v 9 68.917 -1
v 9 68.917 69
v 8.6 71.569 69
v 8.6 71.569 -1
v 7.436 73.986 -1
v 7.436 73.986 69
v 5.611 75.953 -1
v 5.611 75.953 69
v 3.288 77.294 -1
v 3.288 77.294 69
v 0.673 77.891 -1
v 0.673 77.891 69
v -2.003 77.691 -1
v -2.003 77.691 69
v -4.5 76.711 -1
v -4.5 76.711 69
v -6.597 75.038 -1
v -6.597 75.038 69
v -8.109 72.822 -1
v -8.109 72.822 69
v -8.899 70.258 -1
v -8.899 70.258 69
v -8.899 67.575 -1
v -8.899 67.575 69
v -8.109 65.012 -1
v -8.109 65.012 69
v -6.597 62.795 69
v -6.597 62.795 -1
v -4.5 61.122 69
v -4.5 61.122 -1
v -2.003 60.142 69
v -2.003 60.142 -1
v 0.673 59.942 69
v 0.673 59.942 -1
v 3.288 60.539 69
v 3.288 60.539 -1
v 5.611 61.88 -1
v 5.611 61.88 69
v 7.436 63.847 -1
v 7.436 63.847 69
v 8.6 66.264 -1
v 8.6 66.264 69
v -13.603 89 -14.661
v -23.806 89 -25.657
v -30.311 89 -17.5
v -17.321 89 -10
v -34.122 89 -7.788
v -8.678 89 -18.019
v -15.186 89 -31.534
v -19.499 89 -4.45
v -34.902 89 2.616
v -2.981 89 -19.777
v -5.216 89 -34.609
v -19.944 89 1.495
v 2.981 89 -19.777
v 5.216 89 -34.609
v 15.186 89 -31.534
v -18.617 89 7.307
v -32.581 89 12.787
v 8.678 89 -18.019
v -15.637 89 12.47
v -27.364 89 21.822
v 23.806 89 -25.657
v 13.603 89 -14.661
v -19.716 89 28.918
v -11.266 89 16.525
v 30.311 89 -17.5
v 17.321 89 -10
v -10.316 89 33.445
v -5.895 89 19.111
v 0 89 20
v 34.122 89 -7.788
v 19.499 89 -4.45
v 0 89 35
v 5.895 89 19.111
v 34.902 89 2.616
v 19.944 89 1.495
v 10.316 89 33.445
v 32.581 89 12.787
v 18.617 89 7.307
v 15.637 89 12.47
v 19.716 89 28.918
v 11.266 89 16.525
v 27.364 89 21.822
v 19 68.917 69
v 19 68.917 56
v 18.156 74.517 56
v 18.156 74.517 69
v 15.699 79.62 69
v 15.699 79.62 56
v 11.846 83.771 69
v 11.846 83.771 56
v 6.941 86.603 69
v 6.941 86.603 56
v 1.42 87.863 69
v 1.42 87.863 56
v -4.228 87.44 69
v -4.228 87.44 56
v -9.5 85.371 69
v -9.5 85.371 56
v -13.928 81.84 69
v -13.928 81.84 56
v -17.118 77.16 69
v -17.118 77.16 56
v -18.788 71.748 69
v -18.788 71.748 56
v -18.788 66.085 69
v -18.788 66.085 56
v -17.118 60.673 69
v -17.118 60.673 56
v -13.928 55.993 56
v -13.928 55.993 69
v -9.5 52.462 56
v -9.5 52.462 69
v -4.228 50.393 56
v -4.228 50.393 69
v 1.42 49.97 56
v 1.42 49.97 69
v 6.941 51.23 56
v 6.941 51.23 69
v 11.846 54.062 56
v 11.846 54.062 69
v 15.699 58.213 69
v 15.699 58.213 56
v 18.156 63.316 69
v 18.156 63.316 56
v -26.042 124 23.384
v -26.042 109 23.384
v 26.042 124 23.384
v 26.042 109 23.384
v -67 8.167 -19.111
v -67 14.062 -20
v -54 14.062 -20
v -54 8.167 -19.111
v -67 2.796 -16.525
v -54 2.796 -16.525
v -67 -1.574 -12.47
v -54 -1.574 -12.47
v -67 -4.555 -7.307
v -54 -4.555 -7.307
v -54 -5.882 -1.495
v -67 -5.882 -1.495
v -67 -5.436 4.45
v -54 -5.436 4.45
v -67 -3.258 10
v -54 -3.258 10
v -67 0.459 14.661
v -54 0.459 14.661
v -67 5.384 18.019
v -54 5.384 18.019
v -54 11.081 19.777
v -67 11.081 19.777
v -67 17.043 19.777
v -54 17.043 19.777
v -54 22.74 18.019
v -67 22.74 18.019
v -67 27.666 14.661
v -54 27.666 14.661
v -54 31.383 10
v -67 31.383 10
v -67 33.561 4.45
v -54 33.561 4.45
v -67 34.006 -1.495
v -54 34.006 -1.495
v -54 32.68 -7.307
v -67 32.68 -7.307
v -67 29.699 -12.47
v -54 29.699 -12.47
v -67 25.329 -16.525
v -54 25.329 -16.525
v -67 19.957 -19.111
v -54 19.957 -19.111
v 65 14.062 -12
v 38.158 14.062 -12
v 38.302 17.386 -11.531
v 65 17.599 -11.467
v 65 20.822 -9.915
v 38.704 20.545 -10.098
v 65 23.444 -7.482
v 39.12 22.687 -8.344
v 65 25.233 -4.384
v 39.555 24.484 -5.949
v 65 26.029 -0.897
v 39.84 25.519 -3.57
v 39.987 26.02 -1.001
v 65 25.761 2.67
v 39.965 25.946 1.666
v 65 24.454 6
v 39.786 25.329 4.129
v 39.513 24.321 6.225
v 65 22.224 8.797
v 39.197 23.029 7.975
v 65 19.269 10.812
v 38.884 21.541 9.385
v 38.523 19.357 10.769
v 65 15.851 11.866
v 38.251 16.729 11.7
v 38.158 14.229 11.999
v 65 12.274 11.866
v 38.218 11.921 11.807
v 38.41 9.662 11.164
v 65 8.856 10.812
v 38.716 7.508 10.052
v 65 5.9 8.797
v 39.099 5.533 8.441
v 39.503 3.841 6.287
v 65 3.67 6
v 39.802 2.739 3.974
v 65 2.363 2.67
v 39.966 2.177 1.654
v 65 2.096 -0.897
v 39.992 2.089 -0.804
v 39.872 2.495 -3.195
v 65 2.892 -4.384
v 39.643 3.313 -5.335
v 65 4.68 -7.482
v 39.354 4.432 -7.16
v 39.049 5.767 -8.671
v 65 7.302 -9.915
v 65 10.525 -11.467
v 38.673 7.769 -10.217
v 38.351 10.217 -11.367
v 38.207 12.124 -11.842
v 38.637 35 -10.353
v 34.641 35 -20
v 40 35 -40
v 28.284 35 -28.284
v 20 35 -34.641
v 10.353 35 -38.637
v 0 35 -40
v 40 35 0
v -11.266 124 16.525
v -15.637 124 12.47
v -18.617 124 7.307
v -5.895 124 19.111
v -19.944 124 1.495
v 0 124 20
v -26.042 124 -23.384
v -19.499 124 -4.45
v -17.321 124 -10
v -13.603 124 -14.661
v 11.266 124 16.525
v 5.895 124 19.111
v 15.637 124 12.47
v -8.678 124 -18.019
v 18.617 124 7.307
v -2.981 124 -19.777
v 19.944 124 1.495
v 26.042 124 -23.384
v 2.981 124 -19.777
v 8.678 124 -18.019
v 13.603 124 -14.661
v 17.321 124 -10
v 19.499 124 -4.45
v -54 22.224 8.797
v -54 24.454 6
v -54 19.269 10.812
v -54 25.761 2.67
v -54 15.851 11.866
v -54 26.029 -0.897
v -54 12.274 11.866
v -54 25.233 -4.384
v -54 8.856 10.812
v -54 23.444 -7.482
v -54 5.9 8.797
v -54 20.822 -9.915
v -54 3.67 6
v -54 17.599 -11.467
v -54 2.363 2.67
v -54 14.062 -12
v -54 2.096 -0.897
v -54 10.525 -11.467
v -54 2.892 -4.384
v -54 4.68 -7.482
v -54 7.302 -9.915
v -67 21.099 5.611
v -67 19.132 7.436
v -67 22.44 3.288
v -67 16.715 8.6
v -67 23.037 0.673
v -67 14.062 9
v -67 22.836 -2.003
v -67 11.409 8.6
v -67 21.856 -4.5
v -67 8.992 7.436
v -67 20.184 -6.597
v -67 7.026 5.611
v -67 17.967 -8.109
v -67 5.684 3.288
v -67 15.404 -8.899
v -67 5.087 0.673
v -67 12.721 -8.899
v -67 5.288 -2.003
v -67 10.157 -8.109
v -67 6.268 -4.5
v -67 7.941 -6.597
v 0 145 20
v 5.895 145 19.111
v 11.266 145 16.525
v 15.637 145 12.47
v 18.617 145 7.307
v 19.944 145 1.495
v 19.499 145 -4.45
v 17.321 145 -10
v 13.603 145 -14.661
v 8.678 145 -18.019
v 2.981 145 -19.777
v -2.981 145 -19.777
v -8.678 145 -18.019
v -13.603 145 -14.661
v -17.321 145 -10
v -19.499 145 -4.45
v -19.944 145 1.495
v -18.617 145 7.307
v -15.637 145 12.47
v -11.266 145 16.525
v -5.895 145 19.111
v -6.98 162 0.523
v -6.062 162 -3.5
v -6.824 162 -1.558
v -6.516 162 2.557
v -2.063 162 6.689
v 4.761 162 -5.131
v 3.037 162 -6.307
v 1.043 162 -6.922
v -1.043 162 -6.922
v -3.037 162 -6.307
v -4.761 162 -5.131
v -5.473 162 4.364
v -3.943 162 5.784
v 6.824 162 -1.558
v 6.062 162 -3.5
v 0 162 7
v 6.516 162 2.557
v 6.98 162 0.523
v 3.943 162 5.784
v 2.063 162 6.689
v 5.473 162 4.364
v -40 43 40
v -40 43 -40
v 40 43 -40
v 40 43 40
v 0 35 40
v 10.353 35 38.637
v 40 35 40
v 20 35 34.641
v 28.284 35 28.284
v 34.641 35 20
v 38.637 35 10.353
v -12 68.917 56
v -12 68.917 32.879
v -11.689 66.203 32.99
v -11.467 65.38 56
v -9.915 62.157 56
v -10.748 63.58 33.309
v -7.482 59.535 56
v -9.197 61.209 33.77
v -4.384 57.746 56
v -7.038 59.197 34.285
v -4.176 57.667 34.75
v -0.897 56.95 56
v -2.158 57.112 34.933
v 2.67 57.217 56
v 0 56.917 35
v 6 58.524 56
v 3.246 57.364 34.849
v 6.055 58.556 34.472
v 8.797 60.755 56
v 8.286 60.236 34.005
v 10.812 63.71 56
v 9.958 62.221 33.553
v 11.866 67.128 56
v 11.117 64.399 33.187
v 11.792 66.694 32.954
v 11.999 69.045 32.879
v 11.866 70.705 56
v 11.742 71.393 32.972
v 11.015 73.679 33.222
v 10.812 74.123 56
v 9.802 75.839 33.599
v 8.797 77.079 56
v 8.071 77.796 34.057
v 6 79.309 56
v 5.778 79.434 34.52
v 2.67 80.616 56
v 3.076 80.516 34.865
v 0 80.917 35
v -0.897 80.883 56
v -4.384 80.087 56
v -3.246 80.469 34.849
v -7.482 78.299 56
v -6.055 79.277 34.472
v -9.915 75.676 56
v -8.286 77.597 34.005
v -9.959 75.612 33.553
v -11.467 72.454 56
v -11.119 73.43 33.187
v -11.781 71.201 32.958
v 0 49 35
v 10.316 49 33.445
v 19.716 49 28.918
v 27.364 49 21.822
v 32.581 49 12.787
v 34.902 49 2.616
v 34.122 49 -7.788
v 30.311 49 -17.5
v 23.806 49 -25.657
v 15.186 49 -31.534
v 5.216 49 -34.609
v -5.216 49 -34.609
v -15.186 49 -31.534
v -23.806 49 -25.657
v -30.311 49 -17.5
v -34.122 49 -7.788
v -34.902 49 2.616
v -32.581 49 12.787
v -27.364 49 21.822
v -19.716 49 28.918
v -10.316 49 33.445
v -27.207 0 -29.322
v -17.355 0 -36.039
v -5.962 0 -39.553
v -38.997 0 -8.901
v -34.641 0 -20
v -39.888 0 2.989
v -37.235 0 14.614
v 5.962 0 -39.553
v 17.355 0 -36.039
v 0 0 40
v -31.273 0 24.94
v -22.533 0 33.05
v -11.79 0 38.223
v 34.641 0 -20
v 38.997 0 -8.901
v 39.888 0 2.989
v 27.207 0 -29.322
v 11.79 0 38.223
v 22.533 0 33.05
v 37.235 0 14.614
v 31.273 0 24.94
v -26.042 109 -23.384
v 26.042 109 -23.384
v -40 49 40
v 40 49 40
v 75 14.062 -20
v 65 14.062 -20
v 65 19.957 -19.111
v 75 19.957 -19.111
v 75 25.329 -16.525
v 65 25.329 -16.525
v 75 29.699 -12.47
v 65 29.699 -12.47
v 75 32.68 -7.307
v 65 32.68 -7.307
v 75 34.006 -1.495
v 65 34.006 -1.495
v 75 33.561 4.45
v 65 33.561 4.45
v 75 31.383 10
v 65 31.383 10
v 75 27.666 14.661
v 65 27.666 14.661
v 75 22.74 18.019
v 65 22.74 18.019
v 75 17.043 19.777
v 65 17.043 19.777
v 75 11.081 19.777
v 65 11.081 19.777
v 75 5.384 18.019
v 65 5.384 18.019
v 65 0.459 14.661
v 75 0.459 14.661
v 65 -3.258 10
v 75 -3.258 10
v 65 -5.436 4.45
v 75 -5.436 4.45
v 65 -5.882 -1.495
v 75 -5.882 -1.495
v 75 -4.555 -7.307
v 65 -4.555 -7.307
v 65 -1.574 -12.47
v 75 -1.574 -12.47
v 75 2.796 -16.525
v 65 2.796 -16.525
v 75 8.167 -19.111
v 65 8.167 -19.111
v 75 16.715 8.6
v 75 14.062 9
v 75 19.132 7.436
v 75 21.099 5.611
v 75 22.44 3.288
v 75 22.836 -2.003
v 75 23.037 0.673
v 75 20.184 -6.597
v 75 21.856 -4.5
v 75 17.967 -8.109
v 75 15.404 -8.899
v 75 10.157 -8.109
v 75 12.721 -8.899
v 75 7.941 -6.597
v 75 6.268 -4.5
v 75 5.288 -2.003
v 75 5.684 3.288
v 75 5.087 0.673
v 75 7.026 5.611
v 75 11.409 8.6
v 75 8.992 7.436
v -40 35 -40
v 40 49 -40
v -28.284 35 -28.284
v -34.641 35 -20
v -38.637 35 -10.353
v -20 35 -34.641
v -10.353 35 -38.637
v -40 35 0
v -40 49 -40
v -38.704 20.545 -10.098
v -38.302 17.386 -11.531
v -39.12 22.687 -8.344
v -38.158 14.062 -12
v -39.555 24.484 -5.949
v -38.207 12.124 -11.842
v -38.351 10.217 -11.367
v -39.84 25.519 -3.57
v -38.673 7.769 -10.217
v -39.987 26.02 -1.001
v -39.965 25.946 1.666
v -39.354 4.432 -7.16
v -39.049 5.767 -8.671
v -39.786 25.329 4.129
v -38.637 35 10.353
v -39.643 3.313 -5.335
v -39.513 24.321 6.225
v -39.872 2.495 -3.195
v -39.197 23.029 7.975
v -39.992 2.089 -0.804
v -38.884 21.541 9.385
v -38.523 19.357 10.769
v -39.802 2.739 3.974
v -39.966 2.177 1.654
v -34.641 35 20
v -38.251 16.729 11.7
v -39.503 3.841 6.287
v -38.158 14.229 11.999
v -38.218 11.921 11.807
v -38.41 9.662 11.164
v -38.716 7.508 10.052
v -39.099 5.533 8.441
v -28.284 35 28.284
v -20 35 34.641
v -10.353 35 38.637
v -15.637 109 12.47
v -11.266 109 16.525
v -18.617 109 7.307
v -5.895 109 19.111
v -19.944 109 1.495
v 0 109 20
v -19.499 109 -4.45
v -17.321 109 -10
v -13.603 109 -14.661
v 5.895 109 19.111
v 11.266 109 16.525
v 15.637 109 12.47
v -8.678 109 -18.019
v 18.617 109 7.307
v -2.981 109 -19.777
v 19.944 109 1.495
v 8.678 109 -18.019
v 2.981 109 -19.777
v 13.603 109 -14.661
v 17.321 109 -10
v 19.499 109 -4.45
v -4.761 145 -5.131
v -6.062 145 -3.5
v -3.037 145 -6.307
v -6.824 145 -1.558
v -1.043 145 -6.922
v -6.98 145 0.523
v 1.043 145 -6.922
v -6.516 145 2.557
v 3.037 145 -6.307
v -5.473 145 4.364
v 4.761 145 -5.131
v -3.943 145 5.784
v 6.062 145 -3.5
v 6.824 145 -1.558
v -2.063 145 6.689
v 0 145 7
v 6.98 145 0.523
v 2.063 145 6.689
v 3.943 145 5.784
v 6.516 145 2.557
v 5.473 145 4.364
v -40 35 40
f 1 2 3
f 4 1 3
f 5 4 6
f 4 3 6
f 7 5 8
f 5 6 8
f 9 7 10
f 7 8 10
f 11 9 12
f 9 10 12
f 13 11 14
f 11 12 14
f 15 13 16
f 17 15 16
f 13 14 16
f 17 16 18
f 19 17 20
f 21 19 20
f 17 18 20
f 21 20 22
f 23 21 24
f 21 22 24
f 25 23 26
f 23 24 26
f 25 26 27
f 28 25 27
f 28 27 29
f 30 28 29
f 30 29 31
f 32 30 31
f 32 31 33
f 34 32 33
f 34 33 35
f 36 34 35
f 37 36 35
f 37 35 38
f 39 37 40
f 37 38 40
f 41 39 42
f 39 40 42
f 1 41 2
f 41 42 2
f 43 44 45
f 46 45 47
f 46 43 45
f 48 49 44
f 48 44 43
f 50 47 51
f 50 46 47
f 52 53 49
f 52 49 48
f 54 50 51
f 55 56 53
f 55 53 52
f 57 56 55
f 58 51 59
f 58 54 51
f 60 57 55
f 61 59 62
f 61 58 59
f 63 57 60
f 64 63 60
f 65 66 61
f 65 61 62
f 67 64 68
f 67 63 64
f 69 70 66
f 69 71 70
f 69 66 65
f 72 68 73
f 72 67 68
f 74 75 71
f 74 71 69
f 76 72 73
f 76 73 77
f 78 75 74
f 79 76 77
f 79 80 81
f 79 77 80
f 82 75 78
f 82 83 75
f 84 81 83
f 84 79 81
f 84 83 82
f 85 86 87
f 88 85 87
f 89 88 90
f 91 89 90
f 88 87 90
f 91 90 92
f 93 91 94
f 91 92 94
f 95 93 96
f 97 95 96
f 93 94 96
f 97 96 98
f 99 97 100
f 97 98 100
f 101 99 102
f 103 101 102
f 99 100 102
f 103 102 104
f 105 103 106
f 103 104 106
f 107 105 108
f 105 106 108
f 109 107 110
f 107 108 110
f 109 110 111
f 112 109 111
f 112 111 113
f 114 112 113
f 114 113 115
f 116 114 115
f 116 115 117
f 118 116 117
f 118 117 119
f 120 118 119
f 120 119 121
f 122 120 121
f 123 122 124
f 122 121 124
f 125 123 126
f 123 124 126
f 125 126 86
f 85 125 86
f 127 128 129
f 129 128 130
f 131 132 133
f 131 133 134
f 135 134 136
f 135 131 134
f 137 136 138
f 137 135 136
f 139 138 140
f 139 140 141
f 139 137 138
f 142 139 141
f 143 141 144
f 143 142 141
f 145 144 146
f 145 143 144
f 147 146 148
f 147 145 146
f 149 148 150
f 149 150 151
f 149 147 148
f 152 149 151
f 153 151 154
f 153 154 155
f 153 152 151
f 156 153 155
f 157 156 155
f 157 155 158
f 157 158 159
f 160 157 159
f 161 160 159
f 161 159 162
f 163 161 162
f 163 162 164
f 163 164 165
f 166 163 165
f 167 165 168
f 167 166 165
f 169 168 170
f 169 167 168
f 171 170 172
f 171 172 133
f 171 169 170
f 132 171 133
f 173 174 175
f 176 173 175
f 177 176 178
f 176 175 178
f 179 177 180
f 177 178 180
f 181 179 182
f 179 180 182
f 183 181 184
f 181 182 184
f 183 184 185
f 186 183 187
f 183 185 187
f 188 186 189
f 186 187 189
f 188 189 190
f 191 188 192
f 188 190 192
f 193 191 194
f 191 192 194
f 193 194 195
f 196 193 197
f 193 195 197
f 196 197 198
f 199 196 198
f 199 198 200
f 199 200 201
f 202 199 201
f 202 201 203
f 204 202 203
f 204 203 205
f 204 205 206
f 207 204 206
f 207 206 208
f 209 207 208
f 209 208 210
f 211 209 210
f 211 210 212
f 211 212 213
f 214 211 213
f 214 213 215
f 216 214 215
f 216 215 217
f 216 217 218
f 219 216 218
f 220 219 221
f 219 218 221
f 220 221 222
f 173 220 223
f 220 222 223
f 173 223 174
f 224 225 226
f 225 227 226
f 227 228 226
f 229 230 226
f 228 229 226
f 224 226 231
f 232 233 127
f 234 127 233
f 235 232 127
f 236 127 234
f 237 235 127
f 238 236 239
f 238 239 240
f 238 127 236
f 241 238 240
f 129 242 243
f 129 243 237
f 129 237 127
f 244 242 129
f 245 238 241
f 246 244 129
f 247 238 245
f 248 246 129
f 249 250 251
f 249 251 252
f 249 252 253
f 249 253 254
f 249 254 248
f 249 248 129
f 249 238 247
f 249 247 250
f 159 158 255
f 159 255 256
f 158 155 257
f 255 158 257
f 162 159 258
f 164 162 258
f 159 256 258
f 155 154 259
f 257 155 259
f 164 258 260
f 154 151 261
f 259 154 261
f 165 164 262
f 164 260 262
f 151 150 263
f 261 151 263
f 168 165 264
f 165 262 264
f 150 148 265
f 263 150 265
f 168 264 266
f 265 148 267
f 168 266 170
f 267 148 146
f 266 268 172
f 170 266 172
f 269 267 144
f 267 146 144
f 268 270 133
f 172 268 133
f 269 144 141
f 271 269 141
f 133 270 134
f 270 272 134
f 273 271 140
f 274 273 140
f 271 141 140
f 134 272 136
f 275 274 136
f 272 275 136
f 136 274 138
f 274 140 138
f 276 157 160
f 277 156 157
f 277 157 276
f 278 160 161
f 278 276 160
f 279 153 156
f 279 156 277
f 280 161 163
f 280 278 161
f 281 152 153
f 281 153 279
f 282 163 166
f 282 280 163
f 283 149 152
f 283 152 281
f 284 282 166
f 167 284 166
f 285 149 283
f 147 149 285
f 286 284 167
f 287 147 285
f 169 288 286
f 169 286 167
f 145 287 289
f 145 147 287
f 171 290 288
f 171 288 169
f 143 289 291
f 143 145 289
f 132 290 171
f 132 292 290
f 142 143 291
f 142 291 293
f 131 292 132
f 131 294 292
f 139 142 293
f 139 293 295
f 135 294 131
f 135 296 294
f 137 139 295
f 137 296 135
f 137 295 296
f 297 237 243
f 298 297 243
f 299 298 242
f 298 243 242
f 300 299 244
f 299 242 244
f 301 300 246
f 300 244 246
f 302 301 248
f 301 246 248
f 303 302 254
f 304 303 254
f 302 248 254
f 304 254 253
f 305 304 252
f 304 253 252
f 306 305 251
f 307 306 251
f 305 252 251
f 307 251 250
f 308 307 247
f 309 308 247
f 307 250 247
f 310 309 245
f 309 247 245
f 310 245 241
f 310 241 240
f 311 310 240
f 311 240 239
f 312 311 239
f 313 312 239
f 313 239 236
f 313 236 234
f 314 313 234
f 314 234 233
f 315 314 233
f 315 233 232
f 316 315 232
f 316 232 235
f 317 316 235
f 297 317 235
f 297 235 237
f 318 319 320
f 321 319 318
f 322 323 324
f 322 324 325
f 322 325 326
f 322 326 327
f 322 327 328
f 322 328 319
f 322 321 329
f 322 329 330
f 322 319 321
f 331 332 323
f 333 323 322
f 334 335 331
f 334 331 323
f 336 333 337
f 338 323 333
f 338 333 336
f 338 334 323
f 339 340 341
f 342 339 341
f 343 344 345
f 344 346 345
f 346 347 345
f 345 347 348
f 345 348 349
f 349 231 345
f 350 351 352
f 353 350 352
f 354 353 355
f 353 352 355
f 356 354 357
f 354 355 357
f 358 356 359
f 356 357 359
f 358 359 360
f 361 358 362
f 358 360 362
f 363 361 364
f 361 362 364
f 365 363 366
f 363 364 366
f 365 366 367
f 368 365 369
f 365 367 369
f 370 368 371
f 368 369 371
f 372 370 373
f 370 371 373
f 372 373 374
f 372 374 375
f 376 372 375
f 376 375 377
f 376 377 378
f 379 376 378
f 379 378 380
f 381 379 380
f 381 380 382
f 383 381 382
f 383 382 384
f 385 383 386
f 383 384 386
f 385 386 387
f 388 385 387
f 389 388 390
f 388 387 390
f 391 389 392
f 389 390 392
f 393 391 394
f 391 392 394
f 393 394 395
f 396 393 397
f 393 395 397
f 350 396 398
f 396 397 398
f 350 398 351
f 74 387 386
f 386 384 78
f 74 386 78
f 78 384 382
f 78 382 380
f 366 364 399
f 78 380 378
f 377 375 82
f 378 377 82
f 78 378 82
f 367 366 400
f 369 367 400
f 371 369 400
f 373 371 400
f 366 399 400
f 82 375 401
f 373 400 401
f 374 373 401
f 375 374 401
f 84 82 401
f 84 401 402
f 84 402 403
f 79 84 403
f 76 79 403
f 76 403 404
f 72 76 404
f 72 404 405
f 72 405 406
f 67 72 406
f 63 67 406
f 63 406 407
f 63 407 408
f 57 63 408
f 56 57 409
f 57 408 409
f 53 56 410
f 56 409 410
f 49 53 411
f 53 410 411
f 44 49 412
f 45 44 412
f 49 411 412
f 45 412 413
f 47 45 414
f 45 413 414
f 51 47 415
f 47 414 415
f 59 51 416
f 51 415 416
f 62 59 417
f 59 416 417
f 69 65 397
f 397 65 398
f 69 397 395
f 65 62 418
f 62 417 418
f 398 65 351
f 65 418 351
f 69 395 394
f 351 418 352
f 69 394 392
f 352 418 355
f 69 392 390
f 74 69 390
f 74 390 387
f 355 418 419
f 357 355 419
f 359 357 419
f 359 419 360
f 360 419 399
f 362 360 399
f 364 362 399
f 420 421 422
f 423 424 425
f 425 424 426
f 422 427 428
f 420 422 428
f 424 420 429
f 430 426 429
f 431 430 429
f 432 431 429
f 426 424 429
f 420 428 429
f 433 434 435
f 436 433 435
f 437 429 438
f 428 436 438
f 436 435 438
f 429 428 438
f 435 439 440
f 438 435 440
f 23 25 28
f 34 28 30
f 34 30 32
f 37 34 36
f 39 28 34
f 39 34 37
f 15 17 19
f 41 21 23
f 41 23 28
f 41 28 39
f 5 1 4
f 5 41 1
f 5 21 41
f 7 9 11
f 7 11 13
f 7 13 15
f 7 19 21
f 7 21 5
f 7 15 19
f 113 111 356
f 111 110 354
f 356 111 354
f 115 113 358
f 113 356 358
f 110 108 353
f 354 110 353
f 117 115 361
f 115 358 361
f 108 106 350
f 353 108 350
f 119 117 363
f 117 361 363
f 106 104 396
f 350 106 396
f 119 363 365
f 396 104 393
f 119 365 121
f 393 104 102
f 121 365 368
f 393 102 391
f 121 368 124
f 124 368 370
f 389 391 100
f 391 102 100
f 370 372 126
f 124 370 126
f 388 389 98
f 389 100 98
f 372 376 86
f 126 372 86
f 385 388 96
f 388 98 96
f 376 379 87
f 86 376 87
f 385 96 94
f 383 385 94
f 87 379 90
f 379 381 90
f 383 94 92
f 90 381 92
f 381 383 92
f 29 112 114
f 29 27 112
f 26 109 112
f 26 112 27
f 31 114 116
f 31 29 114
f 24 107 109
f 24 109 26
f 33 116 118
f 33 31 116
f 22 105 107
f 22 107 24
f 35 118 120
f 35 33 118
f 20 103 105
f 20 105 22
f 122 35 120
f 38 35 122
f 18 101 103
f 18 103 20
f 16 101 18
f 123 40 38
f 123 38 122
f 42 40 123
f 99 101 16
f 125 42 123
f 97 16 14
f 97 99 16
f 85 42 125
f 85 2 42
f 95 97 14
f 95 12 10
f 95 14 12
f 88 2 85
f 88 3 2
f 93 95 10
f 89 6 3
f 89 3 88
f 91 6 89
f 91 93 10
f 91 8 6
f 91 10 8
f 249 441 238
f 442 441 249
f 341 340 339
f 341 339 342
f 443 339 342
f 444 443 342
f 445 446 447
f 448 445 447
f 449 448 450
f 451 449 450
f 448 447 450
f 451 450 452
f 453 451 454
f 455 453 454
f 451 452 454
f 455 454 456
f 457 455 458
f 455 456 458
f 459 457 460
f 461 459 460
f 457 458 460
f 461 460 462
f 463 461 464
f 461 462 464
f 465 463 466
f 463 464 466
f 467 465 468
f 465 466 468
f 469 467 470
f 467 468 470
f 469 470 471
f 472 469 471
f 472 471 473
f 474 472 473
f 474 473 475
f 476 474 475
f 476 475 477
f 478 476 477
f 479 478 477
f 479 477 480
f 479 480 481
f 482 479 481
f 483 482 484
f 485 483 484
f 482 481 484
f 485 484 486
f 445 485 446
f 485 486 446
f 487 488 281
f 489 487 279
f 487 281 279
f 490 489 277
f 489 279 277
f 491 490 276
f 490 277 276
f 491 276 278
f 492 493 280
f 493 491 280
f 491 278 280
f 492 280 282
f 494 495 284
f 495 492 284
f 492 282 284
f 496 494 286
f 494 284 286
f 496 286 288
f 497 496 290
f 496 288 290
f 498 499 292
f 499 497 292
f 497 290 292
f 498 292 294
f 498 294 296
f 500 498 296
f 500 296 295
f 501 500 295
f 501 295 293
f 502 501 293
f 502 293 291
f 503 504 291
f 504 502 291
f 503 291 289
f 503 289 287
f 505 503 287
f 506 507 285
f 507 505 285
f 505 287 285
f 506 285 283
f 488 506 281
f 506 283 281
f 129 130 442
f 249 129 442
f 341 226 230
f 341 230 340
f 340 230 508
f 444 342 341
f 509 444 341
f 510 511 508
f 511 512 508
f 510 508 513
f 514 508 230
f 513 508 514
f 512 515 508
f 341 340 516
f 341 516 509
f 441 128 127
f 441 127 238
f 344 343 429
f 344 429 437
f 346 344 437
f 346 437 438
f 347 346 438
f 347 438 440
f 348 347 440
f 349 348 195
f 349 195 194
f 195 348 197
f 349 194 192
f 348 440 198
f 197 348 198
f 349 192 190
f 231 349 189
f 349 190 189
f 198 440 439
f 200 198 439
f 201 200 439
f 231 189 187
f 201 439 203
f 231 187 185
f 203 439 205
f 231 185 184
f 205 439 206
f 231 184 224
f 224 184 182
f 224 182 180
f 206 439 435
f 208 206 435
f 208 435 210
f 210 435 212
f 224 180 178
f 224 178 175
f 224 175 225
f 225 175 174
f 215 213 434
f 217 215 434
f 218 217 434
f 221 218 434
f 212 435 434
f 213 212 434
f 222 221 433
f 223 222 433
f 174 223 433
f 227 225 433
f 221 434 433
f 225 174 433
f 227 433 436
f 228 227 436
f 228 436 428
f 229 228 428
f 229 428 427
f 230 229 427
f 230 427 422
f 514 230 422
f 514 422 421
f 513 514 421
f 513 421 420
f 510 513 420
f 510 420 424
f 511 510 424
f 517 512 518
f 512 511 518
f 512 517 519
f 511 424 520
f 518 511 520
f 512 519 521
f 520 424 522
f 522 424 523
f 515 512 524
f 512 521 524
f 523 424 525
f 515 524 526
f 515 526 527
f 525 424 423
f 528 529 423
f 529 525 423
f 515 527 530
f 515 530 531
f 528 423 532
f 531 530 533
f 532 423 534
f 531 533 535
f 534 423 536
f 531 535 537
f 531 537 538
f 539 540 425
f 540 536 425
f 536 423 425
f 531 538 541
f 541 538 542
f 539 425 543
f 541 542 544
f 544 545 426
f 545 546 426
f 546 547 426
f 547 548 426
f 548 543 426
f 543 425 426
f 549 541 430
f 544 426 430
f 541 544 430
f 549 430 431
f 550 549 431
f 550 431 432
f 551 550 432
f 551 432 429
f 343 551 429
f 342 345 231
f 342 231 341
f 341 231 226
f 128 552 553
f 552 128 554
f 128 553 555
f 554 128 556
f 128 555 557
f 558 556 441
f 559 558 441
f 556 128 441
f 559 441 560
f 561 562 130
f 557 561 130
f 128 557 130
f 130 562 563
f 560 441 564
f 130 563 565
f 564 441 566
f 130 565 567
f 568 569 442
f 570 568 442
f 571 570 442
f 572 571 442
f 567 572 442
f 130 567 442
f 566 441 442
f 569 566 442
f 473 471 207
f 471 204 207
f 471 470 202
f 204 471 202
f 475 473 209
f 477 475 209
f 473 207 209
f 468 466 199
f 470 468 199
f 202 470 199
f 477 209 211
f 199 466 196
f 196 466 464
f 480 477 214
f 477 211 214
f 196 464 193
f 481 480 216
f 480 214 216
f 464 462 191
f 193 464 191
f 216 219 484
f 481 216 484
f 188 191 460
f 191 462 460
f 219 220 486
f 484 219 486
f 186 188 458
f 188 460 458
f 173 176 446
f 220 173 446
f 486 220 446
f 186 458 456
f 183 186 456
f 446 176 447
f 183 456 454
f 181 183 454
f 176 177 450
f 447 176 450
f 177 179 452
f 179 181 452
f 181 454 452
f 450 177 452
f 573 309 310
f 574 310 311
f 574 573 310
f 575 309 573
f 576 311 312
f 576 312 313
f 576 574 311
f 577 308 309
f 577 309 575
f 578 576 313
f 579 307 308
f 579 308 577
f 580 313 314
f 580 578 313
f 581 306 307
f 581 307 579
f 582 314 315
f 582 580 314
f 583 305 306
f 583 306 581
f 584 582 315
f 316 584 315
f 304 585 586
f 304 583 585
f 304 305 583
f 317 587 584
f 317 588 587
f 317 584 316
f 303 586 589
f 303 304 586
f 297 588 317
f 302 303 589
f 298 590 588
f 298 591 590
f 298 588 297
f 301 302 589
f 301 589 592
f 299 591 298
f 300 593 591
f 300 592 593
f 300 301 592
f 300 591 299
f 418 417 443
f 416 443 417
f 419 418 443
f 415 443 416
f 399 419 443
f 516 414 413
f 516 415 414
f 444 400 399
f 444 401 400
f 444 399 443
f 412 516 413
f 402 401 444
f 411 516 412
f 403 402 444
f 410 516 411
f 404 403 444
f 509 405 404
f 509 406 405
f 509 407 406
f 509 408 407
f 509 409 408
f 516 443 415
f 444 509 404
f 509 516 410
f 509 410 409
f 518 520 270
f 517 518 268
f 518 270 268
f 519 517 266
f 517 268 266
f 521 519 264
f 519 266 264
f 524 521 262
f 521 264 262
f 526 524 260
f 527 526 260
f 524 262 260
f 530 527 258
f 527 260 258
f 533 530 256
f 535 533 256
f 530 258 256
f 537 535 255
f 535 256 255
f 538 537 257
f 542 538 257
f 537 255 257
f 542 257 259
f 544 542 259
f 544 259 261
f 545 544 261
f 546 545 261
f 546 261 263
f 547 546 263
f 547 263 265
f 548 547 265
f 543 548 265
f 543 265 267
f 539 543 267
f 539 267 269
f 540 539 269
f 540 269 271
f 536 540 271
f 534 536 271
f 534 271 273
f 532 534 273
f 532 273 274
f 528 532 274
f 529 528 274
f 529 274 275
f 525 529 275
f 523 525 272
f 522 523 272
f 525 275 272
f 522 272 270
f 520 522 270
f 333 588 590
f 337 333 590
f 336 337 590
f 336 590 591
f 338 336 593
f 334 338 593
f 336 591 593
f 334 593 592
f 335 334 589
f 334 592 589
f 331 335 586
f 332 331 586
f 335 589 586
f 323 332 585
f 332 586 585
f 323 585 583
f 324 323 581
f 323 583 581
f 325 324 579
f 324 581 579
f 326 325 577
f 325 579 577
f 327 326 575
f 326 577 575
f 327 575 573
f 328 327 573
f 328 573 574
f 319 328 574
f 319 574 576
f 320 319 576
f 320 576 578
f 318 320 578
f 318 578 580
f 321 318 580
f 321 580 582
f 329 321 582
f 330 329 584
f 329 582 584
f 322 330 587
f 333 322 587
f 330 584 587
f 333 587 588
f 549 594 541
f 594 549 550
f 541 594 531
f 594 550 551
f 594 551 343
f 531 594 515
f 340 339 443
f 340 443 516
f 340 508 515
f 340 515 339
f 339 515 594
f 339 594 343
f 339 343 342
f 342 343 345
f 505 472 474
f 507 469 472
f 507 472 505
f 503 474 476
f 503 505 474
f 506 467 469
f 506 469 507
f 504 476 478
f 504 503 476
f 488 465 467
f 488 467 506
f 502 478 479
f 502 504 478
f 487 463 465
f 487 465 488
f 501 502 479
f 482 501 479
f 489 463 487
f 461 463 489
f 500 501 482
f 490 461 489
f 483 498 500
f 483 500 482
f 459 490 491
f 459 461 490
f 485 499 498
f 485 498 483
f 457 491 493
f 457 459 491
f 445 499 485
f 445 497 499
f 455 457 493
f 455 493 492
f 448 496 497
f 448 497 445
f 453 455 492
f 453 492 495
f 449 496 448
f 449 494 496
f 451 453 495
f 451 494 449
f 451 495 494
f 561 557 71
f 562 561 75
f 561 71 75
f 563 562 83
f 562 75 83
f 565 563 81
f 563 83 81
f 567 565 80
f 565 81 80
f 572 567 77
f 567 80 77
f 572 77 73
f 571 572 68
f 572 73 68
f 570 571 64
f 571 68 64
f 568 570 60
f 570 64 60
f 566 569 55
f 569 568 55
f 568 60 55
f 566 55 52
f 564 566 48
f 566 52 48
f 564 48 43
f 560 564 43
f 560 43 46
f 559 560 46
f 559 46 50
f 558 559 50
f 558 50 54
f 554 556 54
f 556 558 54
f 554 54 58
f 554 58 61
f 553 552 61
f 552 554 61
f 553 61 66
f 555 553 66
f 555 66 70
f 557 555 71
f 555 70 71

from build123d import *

# Parameters (mm, degrees)
SKETCH1_R                = 40
BOSS_EXTRUDE1_DEPTH      = 35
BOSS_EXTRUDE2_DEPTH      = 65
BOSS_EXTRUDE2_DEPTH_BACK = 54
SKETCH2_R                = 12
SKETCH3_R                = 20
BOSS_EXTRUDE3_DEPTH      = 10
BOSS_EXTRUDE4_DEPTH      = 8
SKETCH8_W                = 80
SKETCH8_H                = 80
BOSS_EXTRUDE5_DEPTH      = 6
SKETCH9_R                = 35
BOSS_EXTRUDE6_DEPTH      = 40
SKETCH10_R               = 20
BOSS_EXTRUDE7_DEPTH      = 56
SKETCH13_W               = 52.083997036
SKETCH13_H               = 46.768122186
BOSS_EXTRUDE8_DEPTH      = 15
SKETCH14_R               = 12
BOSS_EXTRUDE9_DEPTH      = 56
SKETCH15_R               = 19
BOSS_EXTRUDE10_DEPTH     = 13
SKETCH21_R               = 7
BOSS_EXTRUDE12_DEPTH     = 17
BOSS_EXTRUDE11_START     = 13
SKETCH18_R               = 20
BOSS_EXTRUDE11_DEPTH     = 13
SKETCH20_R               = 9
CUT_EXTRUDE3_DEPTH       = 37
CUT_EXTRUDE2_START       = -159
SKETCH4_R                = 9
CUT_EXTRUDE2_DEPTH       = 159
SKETCH16_R               = 9
CUT_EXTRUDE4_DEPTH       = 70


with BuildPart() as part:
    # Sketch1 → Boss-Extrude1 (new body)
    with BuildSketch(Plane(origin=(0, 0, 0), x_dir=(1, 0, 0), z_dir=(0, 1, 0))):
        with Locations(Location((0, 0, 0), (0, 0, 270))):
            Circle(SKETCH1_R)
    extrude(amount=BOSS_EXTRUDE1_DEPTH)

    # Sketch2 → Boss-Extrude2 (add, two sides: drawn at the far end of the back side and taken through both)
    with BuildSketch(Plane(origin=(0, 0, 0), x_dir=(0, 0, -1), z_dir=(1, 0, 0)).offset(-BOSS_EXTRUDE2_DEPTH_BACK)):
        with Locations((0, 14.062144172)):
            Circle(SKETCH2_R)
    extrude(amount=BOSS_EXTRUDE2_DEPTH + BOSS_EXTRUDE2_DEPTH_BACK)

    # Sketch3 → Boss-Extrude3 (add)
    with BuildSketch(Plane(origin=(65, 0, 0), x_dir=(0, 0, -1), z_dir=(1, 0, 0))):
        with Locations((0, 14.062144172)):
            Circle(SKETCH3_R)
    extrude(amount=BOSS_EXTRUDE3_DEPTH)

    # Sketch6 → Boss-Extrude4 (add)
    with BuildSketch(Plane(origin=(0, 35, 0), x_dir=(1, 0, 0), z_dir=(0, 1, 0))):
        Polygon((0, 40), (-40, 40), (-40, -40), (40, -40), (40, 40), align=None)
    extrude(amount=BOSS_EXTRUDE4_DEPTH)

    # Sketch18 → Boss-Extrude11 (add)
    with BuildSketch(Plane.ZY.offset(54).offset(BOSS_EXTRUDE11_START)):
        with Locations(Location((0, 14.062144172, 0), (0, 0, 180))):
            Circle(SKETCH18_R)
    extrude(amount=-BOSS_EXTRUDE11_DEPTH)

    # Sketch20 → Cut-Extrude3 (cut)
    with BuildSketch(Plane.ZY.offset(67)):
        with Locations((0, 14.062144172)):
            Circle(SKETCH20_R)
    extrude(amount=-CUT_EXTRUDE3_DEPTH, mode=Mode.SUBTRACT)

    # Sketch4 → Cut-Extrude2 (cut)
    with BuildSketch(Plane(origin=(75, 0, 0), x_dir=(0, 0, -1), z_dir=(1, 0, 0)).offset(CUT_EXTRUDE2_START)):
        with Locations(Location((0, 14.062144172, 0), (0, 0, 180))):
            Circle(SKETCH4_R)
    extrude(amount=CUT_EXTRUDE2_DEPTH, mode=Mode.SUBTRACT)


with BuildPart() as body_2:
    # Sketch8 → Boss-Extrude5 (new body)
    with BuildSketch(Plane(origin=(0, 43, 0), x_dir=(1, 0, 0), z_dir=(0, 1, 0))):
        Rectangle(SKETCH8_W, SKETCH8_H)
    extrude(amount=BOSS_EXTRUDE5_DEPTH)

    # Sketch9 → Boss-Extrude6 (add)
    with BuildSketch(Plane(origin=(0, 49, 0), x_dir=(1, 0, 0), z_dir=(0, 1, 0))):
        with Locations(Location((0, 0, 0), (0, 0, 270))):
            Circle(SKETCH9_R)
    extrude(amount=BOSS_EXTRUDE6_DEPTH)

    # Sketch10 → Boss-Extrude7 (add)
    with BuildSketch(Plane(origin=(0, 89, 0), x_dir=(1, 0, 0), z_dir=(0, 1, 0))):
        with Locations(Location((0, 0, 0), (0, 0, 270))):
            Circle(SKETCH10_R)
    extrude(amount=BOSS_EXTRUDE7_DEPTH)

    # Sketch13 → Boss-Extrude8 (add)
    with BuildSketch(Plane(origin=(0, 109, 0), x_dir=(1, 0, 0), z_dir=(0, 1, 0))):
        Rectangle(SKETCH13_W, SKETCH13_H)
    extrude(amount=BOSS_EXTRUDE8_DEPTH)

    # Sketch14 → Boss-Extrude9 (add)
    with BuildSketch(Plane.XY):
        with Locations(Location((0, 68.916575602, 0), (0, 0, 180))):
            Circle(SKETCH14_R)
    extrude(amount=BOSS_EXTRUDE9_DEPTH)

    # Sketch15 → Boss-Extrude10 (add)
    with BuildSketch(Plane.XY.offset(56)):
        with Locations((0, 68.916575602)):
            Circle(SKETCH15_R)
    extrude(amount=BOSS_EXTRUDE10_DEPTH)

    # Sketch21 → Boss-Extrude12 (add)
    with BuildSketch(Plane(origin=(0, 145, 0), x_dir=(1, 0, 0), z_dir=(0, 1, 0))):
        with Locations(Location((0, 0, 0), (0, 0, 270))):
            Circle(SKETCH21_R)
    extrude(amount=BOSS_EXTRUDE12_DEPTH)

    # Sketch16 → Cut-Extrude4 (cut)
    with BuildSketch(Plane.XY.offset(69)):
        with Locations((0, 68.916575602)):
            Circle(SKETCH16_R)
    extrude(amount=-CUT_EXTRUDE4_DEPTH, mode=Mode.SUBTRACT)


solid = Compound([part.part, body_2.part])
